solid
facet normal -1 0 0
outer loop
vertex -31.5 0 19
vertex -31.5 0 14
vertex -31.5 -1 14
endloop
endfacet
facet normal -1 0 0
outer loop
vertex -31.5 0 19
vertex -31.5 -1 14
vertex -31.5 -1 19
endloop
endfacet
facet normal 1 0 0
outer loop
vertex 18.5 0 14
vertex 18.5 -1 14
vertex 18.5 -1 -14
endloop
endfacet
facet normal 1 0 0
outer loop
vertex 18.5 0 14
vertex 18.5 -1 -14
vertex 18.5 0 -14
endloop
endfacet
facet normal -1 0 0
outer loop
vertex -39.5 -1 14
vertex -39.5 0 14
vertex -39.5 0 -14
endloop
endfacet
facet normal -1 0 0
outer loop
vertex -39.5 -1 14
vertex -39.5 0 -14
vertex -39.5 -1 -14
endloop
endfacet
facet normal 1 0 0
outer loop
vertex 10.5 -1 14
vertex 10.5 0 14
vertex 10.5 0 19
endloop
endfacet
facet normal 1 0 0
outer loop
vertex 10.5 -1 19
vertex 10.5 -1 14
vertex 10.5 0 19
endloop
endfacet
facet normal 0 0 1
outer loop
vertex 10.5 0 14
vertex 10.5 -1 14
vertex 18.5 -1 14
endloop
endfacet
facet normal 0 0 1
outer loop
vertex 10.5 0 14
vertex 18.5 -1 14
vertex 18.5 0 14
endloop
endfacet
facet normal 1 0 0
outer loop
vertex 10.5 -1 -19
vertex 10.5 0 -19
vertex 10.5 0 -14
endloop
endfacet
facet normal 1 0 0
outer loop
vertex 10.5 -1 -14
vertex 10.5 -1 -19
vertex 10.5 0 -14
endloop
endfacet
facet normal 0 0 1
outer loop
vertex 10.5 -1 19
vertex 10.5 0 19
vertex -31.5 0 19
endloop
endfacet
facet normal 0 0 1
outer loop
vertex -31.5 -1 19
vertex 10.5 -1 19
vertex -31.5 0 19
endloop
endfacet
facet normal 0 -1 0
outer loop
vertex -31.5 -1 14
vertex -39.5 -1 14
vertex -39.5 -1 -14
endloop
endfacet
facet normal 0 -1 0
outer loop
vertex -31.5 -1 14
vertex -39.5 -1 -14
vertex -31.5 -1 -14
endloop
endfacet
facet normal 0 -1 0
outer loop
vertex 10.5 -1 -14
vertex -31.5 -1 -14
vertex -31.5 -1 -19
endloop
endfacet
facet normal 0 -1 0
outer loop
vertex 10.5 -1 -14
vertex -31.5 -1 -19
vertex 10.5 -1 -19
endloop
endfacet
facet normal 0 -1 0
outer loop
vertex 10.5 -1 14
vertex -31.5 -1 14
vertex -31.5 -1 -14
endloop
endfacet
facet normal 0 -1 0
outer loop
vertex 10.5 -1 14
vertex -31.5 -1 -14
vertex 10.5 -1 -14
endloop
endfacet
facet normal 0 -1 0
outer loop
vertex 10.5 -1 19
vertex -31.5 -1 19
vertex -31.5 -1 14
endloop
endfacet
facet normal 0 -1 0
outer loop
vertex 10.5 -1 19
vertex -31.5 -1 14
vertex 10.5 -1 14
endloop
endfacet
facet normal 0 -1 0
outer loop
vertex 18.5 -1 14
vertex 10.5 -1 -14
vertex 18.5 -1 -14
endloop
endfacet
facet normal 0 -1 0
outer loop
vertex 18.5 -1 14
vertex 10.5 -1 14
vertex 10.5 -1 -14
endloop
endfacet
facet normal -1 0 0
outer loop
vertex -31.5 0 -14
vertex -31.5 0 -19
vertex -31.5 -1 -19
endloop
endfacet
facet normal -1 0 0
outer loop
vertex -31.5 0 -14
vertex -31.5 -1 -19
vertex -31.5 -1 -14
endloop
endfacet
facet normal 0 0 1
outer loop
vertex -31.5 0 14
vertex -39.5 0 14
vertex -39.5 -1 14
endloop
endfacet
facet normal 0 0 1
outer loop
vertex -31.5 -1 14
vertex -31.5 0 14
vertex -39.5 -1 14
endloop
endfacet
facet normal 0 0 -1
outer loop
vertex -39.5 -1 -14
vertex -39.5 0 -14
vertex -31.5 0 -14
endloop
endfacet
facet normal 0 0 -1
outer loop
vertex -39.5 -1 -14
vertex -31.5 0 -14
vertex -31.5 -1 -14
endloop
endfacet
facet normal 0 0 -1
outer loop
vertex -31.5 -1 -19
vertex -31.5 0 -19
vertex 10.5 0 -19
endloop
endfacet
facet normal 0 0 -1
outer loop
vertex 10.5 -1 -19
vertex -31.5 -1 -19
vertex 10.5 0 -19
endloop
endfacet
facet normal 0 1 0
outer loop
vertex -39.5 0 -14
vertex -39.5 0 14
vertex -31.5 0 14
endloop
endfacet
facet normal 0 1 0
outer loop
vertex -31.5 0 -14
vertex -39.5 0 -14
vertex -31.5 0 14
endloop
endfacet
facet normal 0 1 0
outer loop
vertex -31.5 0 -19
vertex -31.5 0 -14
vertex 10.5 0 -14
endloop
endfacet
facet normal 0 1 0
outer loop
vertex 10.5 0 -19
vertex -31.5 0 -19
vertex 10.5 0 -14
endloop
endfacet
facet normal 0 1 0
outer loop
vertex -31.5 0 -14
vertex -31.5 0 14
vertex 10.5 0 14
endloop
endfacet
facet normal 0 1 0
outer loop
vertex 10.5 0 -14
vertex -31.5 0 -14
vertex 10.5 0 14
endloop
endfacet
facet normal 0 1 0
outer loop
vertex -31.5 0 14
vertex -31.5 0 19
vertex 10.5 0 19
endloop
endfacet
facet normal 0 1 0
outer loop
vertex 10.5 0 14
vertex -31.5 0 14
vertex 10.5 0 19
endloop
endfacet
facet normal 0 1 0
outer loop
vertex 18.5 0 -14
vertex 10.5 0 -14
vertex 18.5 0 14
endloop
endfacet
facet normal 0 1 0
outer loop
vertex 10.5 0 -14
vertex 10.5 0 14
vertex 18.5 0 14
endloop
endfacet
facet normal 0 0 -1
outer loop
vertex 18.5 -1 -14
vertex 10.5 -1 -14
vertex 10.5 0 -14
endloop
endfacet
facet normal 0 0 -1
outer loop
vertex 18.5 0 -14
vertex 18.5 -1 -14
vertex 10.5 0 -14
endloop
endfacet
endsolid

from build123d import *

# Parameters (mm, degrees)
F0_W     = 21
F0_H     = 38
F1_DEPTH = 1
F2_W     = 1
F2_H     = 28
F3_DEPTH = 8
F4_W     = 1
F4_H     = 28
F5_DEPTH = 8


with BuildPart() as f1:
    # F0 (on Front) → F1 (new body)
    with BuildSketch(Plane.XZ):
        Rectangle(F0_W, F0_H)
        with Locations((-21, 0)):
            Rectangle(F0_W, F0_H)
    extrude(amount=F1_DEPTH)

    # F2 (on face) → F3 (join)
    with BuildSketch(Plane.YZ.offset(10.5)):
        with Locations((-0.5, 0)):
            Rectangle(F2_W, F2_H)
    extrude(amount=F3_DEPTH)

    # F4 (on face) → F5 (join)
    with BuildSketch(Plane(origin=(-31.5, 0, 0), x_dir=(0, -1, 0), z_dir=(-1, 0, 0))):
        with Locations((0.5, 0)):
            Rectangle(F4_W, F4_H)
    extrude(amount=F5_DEPTH)


solid = f1.part
